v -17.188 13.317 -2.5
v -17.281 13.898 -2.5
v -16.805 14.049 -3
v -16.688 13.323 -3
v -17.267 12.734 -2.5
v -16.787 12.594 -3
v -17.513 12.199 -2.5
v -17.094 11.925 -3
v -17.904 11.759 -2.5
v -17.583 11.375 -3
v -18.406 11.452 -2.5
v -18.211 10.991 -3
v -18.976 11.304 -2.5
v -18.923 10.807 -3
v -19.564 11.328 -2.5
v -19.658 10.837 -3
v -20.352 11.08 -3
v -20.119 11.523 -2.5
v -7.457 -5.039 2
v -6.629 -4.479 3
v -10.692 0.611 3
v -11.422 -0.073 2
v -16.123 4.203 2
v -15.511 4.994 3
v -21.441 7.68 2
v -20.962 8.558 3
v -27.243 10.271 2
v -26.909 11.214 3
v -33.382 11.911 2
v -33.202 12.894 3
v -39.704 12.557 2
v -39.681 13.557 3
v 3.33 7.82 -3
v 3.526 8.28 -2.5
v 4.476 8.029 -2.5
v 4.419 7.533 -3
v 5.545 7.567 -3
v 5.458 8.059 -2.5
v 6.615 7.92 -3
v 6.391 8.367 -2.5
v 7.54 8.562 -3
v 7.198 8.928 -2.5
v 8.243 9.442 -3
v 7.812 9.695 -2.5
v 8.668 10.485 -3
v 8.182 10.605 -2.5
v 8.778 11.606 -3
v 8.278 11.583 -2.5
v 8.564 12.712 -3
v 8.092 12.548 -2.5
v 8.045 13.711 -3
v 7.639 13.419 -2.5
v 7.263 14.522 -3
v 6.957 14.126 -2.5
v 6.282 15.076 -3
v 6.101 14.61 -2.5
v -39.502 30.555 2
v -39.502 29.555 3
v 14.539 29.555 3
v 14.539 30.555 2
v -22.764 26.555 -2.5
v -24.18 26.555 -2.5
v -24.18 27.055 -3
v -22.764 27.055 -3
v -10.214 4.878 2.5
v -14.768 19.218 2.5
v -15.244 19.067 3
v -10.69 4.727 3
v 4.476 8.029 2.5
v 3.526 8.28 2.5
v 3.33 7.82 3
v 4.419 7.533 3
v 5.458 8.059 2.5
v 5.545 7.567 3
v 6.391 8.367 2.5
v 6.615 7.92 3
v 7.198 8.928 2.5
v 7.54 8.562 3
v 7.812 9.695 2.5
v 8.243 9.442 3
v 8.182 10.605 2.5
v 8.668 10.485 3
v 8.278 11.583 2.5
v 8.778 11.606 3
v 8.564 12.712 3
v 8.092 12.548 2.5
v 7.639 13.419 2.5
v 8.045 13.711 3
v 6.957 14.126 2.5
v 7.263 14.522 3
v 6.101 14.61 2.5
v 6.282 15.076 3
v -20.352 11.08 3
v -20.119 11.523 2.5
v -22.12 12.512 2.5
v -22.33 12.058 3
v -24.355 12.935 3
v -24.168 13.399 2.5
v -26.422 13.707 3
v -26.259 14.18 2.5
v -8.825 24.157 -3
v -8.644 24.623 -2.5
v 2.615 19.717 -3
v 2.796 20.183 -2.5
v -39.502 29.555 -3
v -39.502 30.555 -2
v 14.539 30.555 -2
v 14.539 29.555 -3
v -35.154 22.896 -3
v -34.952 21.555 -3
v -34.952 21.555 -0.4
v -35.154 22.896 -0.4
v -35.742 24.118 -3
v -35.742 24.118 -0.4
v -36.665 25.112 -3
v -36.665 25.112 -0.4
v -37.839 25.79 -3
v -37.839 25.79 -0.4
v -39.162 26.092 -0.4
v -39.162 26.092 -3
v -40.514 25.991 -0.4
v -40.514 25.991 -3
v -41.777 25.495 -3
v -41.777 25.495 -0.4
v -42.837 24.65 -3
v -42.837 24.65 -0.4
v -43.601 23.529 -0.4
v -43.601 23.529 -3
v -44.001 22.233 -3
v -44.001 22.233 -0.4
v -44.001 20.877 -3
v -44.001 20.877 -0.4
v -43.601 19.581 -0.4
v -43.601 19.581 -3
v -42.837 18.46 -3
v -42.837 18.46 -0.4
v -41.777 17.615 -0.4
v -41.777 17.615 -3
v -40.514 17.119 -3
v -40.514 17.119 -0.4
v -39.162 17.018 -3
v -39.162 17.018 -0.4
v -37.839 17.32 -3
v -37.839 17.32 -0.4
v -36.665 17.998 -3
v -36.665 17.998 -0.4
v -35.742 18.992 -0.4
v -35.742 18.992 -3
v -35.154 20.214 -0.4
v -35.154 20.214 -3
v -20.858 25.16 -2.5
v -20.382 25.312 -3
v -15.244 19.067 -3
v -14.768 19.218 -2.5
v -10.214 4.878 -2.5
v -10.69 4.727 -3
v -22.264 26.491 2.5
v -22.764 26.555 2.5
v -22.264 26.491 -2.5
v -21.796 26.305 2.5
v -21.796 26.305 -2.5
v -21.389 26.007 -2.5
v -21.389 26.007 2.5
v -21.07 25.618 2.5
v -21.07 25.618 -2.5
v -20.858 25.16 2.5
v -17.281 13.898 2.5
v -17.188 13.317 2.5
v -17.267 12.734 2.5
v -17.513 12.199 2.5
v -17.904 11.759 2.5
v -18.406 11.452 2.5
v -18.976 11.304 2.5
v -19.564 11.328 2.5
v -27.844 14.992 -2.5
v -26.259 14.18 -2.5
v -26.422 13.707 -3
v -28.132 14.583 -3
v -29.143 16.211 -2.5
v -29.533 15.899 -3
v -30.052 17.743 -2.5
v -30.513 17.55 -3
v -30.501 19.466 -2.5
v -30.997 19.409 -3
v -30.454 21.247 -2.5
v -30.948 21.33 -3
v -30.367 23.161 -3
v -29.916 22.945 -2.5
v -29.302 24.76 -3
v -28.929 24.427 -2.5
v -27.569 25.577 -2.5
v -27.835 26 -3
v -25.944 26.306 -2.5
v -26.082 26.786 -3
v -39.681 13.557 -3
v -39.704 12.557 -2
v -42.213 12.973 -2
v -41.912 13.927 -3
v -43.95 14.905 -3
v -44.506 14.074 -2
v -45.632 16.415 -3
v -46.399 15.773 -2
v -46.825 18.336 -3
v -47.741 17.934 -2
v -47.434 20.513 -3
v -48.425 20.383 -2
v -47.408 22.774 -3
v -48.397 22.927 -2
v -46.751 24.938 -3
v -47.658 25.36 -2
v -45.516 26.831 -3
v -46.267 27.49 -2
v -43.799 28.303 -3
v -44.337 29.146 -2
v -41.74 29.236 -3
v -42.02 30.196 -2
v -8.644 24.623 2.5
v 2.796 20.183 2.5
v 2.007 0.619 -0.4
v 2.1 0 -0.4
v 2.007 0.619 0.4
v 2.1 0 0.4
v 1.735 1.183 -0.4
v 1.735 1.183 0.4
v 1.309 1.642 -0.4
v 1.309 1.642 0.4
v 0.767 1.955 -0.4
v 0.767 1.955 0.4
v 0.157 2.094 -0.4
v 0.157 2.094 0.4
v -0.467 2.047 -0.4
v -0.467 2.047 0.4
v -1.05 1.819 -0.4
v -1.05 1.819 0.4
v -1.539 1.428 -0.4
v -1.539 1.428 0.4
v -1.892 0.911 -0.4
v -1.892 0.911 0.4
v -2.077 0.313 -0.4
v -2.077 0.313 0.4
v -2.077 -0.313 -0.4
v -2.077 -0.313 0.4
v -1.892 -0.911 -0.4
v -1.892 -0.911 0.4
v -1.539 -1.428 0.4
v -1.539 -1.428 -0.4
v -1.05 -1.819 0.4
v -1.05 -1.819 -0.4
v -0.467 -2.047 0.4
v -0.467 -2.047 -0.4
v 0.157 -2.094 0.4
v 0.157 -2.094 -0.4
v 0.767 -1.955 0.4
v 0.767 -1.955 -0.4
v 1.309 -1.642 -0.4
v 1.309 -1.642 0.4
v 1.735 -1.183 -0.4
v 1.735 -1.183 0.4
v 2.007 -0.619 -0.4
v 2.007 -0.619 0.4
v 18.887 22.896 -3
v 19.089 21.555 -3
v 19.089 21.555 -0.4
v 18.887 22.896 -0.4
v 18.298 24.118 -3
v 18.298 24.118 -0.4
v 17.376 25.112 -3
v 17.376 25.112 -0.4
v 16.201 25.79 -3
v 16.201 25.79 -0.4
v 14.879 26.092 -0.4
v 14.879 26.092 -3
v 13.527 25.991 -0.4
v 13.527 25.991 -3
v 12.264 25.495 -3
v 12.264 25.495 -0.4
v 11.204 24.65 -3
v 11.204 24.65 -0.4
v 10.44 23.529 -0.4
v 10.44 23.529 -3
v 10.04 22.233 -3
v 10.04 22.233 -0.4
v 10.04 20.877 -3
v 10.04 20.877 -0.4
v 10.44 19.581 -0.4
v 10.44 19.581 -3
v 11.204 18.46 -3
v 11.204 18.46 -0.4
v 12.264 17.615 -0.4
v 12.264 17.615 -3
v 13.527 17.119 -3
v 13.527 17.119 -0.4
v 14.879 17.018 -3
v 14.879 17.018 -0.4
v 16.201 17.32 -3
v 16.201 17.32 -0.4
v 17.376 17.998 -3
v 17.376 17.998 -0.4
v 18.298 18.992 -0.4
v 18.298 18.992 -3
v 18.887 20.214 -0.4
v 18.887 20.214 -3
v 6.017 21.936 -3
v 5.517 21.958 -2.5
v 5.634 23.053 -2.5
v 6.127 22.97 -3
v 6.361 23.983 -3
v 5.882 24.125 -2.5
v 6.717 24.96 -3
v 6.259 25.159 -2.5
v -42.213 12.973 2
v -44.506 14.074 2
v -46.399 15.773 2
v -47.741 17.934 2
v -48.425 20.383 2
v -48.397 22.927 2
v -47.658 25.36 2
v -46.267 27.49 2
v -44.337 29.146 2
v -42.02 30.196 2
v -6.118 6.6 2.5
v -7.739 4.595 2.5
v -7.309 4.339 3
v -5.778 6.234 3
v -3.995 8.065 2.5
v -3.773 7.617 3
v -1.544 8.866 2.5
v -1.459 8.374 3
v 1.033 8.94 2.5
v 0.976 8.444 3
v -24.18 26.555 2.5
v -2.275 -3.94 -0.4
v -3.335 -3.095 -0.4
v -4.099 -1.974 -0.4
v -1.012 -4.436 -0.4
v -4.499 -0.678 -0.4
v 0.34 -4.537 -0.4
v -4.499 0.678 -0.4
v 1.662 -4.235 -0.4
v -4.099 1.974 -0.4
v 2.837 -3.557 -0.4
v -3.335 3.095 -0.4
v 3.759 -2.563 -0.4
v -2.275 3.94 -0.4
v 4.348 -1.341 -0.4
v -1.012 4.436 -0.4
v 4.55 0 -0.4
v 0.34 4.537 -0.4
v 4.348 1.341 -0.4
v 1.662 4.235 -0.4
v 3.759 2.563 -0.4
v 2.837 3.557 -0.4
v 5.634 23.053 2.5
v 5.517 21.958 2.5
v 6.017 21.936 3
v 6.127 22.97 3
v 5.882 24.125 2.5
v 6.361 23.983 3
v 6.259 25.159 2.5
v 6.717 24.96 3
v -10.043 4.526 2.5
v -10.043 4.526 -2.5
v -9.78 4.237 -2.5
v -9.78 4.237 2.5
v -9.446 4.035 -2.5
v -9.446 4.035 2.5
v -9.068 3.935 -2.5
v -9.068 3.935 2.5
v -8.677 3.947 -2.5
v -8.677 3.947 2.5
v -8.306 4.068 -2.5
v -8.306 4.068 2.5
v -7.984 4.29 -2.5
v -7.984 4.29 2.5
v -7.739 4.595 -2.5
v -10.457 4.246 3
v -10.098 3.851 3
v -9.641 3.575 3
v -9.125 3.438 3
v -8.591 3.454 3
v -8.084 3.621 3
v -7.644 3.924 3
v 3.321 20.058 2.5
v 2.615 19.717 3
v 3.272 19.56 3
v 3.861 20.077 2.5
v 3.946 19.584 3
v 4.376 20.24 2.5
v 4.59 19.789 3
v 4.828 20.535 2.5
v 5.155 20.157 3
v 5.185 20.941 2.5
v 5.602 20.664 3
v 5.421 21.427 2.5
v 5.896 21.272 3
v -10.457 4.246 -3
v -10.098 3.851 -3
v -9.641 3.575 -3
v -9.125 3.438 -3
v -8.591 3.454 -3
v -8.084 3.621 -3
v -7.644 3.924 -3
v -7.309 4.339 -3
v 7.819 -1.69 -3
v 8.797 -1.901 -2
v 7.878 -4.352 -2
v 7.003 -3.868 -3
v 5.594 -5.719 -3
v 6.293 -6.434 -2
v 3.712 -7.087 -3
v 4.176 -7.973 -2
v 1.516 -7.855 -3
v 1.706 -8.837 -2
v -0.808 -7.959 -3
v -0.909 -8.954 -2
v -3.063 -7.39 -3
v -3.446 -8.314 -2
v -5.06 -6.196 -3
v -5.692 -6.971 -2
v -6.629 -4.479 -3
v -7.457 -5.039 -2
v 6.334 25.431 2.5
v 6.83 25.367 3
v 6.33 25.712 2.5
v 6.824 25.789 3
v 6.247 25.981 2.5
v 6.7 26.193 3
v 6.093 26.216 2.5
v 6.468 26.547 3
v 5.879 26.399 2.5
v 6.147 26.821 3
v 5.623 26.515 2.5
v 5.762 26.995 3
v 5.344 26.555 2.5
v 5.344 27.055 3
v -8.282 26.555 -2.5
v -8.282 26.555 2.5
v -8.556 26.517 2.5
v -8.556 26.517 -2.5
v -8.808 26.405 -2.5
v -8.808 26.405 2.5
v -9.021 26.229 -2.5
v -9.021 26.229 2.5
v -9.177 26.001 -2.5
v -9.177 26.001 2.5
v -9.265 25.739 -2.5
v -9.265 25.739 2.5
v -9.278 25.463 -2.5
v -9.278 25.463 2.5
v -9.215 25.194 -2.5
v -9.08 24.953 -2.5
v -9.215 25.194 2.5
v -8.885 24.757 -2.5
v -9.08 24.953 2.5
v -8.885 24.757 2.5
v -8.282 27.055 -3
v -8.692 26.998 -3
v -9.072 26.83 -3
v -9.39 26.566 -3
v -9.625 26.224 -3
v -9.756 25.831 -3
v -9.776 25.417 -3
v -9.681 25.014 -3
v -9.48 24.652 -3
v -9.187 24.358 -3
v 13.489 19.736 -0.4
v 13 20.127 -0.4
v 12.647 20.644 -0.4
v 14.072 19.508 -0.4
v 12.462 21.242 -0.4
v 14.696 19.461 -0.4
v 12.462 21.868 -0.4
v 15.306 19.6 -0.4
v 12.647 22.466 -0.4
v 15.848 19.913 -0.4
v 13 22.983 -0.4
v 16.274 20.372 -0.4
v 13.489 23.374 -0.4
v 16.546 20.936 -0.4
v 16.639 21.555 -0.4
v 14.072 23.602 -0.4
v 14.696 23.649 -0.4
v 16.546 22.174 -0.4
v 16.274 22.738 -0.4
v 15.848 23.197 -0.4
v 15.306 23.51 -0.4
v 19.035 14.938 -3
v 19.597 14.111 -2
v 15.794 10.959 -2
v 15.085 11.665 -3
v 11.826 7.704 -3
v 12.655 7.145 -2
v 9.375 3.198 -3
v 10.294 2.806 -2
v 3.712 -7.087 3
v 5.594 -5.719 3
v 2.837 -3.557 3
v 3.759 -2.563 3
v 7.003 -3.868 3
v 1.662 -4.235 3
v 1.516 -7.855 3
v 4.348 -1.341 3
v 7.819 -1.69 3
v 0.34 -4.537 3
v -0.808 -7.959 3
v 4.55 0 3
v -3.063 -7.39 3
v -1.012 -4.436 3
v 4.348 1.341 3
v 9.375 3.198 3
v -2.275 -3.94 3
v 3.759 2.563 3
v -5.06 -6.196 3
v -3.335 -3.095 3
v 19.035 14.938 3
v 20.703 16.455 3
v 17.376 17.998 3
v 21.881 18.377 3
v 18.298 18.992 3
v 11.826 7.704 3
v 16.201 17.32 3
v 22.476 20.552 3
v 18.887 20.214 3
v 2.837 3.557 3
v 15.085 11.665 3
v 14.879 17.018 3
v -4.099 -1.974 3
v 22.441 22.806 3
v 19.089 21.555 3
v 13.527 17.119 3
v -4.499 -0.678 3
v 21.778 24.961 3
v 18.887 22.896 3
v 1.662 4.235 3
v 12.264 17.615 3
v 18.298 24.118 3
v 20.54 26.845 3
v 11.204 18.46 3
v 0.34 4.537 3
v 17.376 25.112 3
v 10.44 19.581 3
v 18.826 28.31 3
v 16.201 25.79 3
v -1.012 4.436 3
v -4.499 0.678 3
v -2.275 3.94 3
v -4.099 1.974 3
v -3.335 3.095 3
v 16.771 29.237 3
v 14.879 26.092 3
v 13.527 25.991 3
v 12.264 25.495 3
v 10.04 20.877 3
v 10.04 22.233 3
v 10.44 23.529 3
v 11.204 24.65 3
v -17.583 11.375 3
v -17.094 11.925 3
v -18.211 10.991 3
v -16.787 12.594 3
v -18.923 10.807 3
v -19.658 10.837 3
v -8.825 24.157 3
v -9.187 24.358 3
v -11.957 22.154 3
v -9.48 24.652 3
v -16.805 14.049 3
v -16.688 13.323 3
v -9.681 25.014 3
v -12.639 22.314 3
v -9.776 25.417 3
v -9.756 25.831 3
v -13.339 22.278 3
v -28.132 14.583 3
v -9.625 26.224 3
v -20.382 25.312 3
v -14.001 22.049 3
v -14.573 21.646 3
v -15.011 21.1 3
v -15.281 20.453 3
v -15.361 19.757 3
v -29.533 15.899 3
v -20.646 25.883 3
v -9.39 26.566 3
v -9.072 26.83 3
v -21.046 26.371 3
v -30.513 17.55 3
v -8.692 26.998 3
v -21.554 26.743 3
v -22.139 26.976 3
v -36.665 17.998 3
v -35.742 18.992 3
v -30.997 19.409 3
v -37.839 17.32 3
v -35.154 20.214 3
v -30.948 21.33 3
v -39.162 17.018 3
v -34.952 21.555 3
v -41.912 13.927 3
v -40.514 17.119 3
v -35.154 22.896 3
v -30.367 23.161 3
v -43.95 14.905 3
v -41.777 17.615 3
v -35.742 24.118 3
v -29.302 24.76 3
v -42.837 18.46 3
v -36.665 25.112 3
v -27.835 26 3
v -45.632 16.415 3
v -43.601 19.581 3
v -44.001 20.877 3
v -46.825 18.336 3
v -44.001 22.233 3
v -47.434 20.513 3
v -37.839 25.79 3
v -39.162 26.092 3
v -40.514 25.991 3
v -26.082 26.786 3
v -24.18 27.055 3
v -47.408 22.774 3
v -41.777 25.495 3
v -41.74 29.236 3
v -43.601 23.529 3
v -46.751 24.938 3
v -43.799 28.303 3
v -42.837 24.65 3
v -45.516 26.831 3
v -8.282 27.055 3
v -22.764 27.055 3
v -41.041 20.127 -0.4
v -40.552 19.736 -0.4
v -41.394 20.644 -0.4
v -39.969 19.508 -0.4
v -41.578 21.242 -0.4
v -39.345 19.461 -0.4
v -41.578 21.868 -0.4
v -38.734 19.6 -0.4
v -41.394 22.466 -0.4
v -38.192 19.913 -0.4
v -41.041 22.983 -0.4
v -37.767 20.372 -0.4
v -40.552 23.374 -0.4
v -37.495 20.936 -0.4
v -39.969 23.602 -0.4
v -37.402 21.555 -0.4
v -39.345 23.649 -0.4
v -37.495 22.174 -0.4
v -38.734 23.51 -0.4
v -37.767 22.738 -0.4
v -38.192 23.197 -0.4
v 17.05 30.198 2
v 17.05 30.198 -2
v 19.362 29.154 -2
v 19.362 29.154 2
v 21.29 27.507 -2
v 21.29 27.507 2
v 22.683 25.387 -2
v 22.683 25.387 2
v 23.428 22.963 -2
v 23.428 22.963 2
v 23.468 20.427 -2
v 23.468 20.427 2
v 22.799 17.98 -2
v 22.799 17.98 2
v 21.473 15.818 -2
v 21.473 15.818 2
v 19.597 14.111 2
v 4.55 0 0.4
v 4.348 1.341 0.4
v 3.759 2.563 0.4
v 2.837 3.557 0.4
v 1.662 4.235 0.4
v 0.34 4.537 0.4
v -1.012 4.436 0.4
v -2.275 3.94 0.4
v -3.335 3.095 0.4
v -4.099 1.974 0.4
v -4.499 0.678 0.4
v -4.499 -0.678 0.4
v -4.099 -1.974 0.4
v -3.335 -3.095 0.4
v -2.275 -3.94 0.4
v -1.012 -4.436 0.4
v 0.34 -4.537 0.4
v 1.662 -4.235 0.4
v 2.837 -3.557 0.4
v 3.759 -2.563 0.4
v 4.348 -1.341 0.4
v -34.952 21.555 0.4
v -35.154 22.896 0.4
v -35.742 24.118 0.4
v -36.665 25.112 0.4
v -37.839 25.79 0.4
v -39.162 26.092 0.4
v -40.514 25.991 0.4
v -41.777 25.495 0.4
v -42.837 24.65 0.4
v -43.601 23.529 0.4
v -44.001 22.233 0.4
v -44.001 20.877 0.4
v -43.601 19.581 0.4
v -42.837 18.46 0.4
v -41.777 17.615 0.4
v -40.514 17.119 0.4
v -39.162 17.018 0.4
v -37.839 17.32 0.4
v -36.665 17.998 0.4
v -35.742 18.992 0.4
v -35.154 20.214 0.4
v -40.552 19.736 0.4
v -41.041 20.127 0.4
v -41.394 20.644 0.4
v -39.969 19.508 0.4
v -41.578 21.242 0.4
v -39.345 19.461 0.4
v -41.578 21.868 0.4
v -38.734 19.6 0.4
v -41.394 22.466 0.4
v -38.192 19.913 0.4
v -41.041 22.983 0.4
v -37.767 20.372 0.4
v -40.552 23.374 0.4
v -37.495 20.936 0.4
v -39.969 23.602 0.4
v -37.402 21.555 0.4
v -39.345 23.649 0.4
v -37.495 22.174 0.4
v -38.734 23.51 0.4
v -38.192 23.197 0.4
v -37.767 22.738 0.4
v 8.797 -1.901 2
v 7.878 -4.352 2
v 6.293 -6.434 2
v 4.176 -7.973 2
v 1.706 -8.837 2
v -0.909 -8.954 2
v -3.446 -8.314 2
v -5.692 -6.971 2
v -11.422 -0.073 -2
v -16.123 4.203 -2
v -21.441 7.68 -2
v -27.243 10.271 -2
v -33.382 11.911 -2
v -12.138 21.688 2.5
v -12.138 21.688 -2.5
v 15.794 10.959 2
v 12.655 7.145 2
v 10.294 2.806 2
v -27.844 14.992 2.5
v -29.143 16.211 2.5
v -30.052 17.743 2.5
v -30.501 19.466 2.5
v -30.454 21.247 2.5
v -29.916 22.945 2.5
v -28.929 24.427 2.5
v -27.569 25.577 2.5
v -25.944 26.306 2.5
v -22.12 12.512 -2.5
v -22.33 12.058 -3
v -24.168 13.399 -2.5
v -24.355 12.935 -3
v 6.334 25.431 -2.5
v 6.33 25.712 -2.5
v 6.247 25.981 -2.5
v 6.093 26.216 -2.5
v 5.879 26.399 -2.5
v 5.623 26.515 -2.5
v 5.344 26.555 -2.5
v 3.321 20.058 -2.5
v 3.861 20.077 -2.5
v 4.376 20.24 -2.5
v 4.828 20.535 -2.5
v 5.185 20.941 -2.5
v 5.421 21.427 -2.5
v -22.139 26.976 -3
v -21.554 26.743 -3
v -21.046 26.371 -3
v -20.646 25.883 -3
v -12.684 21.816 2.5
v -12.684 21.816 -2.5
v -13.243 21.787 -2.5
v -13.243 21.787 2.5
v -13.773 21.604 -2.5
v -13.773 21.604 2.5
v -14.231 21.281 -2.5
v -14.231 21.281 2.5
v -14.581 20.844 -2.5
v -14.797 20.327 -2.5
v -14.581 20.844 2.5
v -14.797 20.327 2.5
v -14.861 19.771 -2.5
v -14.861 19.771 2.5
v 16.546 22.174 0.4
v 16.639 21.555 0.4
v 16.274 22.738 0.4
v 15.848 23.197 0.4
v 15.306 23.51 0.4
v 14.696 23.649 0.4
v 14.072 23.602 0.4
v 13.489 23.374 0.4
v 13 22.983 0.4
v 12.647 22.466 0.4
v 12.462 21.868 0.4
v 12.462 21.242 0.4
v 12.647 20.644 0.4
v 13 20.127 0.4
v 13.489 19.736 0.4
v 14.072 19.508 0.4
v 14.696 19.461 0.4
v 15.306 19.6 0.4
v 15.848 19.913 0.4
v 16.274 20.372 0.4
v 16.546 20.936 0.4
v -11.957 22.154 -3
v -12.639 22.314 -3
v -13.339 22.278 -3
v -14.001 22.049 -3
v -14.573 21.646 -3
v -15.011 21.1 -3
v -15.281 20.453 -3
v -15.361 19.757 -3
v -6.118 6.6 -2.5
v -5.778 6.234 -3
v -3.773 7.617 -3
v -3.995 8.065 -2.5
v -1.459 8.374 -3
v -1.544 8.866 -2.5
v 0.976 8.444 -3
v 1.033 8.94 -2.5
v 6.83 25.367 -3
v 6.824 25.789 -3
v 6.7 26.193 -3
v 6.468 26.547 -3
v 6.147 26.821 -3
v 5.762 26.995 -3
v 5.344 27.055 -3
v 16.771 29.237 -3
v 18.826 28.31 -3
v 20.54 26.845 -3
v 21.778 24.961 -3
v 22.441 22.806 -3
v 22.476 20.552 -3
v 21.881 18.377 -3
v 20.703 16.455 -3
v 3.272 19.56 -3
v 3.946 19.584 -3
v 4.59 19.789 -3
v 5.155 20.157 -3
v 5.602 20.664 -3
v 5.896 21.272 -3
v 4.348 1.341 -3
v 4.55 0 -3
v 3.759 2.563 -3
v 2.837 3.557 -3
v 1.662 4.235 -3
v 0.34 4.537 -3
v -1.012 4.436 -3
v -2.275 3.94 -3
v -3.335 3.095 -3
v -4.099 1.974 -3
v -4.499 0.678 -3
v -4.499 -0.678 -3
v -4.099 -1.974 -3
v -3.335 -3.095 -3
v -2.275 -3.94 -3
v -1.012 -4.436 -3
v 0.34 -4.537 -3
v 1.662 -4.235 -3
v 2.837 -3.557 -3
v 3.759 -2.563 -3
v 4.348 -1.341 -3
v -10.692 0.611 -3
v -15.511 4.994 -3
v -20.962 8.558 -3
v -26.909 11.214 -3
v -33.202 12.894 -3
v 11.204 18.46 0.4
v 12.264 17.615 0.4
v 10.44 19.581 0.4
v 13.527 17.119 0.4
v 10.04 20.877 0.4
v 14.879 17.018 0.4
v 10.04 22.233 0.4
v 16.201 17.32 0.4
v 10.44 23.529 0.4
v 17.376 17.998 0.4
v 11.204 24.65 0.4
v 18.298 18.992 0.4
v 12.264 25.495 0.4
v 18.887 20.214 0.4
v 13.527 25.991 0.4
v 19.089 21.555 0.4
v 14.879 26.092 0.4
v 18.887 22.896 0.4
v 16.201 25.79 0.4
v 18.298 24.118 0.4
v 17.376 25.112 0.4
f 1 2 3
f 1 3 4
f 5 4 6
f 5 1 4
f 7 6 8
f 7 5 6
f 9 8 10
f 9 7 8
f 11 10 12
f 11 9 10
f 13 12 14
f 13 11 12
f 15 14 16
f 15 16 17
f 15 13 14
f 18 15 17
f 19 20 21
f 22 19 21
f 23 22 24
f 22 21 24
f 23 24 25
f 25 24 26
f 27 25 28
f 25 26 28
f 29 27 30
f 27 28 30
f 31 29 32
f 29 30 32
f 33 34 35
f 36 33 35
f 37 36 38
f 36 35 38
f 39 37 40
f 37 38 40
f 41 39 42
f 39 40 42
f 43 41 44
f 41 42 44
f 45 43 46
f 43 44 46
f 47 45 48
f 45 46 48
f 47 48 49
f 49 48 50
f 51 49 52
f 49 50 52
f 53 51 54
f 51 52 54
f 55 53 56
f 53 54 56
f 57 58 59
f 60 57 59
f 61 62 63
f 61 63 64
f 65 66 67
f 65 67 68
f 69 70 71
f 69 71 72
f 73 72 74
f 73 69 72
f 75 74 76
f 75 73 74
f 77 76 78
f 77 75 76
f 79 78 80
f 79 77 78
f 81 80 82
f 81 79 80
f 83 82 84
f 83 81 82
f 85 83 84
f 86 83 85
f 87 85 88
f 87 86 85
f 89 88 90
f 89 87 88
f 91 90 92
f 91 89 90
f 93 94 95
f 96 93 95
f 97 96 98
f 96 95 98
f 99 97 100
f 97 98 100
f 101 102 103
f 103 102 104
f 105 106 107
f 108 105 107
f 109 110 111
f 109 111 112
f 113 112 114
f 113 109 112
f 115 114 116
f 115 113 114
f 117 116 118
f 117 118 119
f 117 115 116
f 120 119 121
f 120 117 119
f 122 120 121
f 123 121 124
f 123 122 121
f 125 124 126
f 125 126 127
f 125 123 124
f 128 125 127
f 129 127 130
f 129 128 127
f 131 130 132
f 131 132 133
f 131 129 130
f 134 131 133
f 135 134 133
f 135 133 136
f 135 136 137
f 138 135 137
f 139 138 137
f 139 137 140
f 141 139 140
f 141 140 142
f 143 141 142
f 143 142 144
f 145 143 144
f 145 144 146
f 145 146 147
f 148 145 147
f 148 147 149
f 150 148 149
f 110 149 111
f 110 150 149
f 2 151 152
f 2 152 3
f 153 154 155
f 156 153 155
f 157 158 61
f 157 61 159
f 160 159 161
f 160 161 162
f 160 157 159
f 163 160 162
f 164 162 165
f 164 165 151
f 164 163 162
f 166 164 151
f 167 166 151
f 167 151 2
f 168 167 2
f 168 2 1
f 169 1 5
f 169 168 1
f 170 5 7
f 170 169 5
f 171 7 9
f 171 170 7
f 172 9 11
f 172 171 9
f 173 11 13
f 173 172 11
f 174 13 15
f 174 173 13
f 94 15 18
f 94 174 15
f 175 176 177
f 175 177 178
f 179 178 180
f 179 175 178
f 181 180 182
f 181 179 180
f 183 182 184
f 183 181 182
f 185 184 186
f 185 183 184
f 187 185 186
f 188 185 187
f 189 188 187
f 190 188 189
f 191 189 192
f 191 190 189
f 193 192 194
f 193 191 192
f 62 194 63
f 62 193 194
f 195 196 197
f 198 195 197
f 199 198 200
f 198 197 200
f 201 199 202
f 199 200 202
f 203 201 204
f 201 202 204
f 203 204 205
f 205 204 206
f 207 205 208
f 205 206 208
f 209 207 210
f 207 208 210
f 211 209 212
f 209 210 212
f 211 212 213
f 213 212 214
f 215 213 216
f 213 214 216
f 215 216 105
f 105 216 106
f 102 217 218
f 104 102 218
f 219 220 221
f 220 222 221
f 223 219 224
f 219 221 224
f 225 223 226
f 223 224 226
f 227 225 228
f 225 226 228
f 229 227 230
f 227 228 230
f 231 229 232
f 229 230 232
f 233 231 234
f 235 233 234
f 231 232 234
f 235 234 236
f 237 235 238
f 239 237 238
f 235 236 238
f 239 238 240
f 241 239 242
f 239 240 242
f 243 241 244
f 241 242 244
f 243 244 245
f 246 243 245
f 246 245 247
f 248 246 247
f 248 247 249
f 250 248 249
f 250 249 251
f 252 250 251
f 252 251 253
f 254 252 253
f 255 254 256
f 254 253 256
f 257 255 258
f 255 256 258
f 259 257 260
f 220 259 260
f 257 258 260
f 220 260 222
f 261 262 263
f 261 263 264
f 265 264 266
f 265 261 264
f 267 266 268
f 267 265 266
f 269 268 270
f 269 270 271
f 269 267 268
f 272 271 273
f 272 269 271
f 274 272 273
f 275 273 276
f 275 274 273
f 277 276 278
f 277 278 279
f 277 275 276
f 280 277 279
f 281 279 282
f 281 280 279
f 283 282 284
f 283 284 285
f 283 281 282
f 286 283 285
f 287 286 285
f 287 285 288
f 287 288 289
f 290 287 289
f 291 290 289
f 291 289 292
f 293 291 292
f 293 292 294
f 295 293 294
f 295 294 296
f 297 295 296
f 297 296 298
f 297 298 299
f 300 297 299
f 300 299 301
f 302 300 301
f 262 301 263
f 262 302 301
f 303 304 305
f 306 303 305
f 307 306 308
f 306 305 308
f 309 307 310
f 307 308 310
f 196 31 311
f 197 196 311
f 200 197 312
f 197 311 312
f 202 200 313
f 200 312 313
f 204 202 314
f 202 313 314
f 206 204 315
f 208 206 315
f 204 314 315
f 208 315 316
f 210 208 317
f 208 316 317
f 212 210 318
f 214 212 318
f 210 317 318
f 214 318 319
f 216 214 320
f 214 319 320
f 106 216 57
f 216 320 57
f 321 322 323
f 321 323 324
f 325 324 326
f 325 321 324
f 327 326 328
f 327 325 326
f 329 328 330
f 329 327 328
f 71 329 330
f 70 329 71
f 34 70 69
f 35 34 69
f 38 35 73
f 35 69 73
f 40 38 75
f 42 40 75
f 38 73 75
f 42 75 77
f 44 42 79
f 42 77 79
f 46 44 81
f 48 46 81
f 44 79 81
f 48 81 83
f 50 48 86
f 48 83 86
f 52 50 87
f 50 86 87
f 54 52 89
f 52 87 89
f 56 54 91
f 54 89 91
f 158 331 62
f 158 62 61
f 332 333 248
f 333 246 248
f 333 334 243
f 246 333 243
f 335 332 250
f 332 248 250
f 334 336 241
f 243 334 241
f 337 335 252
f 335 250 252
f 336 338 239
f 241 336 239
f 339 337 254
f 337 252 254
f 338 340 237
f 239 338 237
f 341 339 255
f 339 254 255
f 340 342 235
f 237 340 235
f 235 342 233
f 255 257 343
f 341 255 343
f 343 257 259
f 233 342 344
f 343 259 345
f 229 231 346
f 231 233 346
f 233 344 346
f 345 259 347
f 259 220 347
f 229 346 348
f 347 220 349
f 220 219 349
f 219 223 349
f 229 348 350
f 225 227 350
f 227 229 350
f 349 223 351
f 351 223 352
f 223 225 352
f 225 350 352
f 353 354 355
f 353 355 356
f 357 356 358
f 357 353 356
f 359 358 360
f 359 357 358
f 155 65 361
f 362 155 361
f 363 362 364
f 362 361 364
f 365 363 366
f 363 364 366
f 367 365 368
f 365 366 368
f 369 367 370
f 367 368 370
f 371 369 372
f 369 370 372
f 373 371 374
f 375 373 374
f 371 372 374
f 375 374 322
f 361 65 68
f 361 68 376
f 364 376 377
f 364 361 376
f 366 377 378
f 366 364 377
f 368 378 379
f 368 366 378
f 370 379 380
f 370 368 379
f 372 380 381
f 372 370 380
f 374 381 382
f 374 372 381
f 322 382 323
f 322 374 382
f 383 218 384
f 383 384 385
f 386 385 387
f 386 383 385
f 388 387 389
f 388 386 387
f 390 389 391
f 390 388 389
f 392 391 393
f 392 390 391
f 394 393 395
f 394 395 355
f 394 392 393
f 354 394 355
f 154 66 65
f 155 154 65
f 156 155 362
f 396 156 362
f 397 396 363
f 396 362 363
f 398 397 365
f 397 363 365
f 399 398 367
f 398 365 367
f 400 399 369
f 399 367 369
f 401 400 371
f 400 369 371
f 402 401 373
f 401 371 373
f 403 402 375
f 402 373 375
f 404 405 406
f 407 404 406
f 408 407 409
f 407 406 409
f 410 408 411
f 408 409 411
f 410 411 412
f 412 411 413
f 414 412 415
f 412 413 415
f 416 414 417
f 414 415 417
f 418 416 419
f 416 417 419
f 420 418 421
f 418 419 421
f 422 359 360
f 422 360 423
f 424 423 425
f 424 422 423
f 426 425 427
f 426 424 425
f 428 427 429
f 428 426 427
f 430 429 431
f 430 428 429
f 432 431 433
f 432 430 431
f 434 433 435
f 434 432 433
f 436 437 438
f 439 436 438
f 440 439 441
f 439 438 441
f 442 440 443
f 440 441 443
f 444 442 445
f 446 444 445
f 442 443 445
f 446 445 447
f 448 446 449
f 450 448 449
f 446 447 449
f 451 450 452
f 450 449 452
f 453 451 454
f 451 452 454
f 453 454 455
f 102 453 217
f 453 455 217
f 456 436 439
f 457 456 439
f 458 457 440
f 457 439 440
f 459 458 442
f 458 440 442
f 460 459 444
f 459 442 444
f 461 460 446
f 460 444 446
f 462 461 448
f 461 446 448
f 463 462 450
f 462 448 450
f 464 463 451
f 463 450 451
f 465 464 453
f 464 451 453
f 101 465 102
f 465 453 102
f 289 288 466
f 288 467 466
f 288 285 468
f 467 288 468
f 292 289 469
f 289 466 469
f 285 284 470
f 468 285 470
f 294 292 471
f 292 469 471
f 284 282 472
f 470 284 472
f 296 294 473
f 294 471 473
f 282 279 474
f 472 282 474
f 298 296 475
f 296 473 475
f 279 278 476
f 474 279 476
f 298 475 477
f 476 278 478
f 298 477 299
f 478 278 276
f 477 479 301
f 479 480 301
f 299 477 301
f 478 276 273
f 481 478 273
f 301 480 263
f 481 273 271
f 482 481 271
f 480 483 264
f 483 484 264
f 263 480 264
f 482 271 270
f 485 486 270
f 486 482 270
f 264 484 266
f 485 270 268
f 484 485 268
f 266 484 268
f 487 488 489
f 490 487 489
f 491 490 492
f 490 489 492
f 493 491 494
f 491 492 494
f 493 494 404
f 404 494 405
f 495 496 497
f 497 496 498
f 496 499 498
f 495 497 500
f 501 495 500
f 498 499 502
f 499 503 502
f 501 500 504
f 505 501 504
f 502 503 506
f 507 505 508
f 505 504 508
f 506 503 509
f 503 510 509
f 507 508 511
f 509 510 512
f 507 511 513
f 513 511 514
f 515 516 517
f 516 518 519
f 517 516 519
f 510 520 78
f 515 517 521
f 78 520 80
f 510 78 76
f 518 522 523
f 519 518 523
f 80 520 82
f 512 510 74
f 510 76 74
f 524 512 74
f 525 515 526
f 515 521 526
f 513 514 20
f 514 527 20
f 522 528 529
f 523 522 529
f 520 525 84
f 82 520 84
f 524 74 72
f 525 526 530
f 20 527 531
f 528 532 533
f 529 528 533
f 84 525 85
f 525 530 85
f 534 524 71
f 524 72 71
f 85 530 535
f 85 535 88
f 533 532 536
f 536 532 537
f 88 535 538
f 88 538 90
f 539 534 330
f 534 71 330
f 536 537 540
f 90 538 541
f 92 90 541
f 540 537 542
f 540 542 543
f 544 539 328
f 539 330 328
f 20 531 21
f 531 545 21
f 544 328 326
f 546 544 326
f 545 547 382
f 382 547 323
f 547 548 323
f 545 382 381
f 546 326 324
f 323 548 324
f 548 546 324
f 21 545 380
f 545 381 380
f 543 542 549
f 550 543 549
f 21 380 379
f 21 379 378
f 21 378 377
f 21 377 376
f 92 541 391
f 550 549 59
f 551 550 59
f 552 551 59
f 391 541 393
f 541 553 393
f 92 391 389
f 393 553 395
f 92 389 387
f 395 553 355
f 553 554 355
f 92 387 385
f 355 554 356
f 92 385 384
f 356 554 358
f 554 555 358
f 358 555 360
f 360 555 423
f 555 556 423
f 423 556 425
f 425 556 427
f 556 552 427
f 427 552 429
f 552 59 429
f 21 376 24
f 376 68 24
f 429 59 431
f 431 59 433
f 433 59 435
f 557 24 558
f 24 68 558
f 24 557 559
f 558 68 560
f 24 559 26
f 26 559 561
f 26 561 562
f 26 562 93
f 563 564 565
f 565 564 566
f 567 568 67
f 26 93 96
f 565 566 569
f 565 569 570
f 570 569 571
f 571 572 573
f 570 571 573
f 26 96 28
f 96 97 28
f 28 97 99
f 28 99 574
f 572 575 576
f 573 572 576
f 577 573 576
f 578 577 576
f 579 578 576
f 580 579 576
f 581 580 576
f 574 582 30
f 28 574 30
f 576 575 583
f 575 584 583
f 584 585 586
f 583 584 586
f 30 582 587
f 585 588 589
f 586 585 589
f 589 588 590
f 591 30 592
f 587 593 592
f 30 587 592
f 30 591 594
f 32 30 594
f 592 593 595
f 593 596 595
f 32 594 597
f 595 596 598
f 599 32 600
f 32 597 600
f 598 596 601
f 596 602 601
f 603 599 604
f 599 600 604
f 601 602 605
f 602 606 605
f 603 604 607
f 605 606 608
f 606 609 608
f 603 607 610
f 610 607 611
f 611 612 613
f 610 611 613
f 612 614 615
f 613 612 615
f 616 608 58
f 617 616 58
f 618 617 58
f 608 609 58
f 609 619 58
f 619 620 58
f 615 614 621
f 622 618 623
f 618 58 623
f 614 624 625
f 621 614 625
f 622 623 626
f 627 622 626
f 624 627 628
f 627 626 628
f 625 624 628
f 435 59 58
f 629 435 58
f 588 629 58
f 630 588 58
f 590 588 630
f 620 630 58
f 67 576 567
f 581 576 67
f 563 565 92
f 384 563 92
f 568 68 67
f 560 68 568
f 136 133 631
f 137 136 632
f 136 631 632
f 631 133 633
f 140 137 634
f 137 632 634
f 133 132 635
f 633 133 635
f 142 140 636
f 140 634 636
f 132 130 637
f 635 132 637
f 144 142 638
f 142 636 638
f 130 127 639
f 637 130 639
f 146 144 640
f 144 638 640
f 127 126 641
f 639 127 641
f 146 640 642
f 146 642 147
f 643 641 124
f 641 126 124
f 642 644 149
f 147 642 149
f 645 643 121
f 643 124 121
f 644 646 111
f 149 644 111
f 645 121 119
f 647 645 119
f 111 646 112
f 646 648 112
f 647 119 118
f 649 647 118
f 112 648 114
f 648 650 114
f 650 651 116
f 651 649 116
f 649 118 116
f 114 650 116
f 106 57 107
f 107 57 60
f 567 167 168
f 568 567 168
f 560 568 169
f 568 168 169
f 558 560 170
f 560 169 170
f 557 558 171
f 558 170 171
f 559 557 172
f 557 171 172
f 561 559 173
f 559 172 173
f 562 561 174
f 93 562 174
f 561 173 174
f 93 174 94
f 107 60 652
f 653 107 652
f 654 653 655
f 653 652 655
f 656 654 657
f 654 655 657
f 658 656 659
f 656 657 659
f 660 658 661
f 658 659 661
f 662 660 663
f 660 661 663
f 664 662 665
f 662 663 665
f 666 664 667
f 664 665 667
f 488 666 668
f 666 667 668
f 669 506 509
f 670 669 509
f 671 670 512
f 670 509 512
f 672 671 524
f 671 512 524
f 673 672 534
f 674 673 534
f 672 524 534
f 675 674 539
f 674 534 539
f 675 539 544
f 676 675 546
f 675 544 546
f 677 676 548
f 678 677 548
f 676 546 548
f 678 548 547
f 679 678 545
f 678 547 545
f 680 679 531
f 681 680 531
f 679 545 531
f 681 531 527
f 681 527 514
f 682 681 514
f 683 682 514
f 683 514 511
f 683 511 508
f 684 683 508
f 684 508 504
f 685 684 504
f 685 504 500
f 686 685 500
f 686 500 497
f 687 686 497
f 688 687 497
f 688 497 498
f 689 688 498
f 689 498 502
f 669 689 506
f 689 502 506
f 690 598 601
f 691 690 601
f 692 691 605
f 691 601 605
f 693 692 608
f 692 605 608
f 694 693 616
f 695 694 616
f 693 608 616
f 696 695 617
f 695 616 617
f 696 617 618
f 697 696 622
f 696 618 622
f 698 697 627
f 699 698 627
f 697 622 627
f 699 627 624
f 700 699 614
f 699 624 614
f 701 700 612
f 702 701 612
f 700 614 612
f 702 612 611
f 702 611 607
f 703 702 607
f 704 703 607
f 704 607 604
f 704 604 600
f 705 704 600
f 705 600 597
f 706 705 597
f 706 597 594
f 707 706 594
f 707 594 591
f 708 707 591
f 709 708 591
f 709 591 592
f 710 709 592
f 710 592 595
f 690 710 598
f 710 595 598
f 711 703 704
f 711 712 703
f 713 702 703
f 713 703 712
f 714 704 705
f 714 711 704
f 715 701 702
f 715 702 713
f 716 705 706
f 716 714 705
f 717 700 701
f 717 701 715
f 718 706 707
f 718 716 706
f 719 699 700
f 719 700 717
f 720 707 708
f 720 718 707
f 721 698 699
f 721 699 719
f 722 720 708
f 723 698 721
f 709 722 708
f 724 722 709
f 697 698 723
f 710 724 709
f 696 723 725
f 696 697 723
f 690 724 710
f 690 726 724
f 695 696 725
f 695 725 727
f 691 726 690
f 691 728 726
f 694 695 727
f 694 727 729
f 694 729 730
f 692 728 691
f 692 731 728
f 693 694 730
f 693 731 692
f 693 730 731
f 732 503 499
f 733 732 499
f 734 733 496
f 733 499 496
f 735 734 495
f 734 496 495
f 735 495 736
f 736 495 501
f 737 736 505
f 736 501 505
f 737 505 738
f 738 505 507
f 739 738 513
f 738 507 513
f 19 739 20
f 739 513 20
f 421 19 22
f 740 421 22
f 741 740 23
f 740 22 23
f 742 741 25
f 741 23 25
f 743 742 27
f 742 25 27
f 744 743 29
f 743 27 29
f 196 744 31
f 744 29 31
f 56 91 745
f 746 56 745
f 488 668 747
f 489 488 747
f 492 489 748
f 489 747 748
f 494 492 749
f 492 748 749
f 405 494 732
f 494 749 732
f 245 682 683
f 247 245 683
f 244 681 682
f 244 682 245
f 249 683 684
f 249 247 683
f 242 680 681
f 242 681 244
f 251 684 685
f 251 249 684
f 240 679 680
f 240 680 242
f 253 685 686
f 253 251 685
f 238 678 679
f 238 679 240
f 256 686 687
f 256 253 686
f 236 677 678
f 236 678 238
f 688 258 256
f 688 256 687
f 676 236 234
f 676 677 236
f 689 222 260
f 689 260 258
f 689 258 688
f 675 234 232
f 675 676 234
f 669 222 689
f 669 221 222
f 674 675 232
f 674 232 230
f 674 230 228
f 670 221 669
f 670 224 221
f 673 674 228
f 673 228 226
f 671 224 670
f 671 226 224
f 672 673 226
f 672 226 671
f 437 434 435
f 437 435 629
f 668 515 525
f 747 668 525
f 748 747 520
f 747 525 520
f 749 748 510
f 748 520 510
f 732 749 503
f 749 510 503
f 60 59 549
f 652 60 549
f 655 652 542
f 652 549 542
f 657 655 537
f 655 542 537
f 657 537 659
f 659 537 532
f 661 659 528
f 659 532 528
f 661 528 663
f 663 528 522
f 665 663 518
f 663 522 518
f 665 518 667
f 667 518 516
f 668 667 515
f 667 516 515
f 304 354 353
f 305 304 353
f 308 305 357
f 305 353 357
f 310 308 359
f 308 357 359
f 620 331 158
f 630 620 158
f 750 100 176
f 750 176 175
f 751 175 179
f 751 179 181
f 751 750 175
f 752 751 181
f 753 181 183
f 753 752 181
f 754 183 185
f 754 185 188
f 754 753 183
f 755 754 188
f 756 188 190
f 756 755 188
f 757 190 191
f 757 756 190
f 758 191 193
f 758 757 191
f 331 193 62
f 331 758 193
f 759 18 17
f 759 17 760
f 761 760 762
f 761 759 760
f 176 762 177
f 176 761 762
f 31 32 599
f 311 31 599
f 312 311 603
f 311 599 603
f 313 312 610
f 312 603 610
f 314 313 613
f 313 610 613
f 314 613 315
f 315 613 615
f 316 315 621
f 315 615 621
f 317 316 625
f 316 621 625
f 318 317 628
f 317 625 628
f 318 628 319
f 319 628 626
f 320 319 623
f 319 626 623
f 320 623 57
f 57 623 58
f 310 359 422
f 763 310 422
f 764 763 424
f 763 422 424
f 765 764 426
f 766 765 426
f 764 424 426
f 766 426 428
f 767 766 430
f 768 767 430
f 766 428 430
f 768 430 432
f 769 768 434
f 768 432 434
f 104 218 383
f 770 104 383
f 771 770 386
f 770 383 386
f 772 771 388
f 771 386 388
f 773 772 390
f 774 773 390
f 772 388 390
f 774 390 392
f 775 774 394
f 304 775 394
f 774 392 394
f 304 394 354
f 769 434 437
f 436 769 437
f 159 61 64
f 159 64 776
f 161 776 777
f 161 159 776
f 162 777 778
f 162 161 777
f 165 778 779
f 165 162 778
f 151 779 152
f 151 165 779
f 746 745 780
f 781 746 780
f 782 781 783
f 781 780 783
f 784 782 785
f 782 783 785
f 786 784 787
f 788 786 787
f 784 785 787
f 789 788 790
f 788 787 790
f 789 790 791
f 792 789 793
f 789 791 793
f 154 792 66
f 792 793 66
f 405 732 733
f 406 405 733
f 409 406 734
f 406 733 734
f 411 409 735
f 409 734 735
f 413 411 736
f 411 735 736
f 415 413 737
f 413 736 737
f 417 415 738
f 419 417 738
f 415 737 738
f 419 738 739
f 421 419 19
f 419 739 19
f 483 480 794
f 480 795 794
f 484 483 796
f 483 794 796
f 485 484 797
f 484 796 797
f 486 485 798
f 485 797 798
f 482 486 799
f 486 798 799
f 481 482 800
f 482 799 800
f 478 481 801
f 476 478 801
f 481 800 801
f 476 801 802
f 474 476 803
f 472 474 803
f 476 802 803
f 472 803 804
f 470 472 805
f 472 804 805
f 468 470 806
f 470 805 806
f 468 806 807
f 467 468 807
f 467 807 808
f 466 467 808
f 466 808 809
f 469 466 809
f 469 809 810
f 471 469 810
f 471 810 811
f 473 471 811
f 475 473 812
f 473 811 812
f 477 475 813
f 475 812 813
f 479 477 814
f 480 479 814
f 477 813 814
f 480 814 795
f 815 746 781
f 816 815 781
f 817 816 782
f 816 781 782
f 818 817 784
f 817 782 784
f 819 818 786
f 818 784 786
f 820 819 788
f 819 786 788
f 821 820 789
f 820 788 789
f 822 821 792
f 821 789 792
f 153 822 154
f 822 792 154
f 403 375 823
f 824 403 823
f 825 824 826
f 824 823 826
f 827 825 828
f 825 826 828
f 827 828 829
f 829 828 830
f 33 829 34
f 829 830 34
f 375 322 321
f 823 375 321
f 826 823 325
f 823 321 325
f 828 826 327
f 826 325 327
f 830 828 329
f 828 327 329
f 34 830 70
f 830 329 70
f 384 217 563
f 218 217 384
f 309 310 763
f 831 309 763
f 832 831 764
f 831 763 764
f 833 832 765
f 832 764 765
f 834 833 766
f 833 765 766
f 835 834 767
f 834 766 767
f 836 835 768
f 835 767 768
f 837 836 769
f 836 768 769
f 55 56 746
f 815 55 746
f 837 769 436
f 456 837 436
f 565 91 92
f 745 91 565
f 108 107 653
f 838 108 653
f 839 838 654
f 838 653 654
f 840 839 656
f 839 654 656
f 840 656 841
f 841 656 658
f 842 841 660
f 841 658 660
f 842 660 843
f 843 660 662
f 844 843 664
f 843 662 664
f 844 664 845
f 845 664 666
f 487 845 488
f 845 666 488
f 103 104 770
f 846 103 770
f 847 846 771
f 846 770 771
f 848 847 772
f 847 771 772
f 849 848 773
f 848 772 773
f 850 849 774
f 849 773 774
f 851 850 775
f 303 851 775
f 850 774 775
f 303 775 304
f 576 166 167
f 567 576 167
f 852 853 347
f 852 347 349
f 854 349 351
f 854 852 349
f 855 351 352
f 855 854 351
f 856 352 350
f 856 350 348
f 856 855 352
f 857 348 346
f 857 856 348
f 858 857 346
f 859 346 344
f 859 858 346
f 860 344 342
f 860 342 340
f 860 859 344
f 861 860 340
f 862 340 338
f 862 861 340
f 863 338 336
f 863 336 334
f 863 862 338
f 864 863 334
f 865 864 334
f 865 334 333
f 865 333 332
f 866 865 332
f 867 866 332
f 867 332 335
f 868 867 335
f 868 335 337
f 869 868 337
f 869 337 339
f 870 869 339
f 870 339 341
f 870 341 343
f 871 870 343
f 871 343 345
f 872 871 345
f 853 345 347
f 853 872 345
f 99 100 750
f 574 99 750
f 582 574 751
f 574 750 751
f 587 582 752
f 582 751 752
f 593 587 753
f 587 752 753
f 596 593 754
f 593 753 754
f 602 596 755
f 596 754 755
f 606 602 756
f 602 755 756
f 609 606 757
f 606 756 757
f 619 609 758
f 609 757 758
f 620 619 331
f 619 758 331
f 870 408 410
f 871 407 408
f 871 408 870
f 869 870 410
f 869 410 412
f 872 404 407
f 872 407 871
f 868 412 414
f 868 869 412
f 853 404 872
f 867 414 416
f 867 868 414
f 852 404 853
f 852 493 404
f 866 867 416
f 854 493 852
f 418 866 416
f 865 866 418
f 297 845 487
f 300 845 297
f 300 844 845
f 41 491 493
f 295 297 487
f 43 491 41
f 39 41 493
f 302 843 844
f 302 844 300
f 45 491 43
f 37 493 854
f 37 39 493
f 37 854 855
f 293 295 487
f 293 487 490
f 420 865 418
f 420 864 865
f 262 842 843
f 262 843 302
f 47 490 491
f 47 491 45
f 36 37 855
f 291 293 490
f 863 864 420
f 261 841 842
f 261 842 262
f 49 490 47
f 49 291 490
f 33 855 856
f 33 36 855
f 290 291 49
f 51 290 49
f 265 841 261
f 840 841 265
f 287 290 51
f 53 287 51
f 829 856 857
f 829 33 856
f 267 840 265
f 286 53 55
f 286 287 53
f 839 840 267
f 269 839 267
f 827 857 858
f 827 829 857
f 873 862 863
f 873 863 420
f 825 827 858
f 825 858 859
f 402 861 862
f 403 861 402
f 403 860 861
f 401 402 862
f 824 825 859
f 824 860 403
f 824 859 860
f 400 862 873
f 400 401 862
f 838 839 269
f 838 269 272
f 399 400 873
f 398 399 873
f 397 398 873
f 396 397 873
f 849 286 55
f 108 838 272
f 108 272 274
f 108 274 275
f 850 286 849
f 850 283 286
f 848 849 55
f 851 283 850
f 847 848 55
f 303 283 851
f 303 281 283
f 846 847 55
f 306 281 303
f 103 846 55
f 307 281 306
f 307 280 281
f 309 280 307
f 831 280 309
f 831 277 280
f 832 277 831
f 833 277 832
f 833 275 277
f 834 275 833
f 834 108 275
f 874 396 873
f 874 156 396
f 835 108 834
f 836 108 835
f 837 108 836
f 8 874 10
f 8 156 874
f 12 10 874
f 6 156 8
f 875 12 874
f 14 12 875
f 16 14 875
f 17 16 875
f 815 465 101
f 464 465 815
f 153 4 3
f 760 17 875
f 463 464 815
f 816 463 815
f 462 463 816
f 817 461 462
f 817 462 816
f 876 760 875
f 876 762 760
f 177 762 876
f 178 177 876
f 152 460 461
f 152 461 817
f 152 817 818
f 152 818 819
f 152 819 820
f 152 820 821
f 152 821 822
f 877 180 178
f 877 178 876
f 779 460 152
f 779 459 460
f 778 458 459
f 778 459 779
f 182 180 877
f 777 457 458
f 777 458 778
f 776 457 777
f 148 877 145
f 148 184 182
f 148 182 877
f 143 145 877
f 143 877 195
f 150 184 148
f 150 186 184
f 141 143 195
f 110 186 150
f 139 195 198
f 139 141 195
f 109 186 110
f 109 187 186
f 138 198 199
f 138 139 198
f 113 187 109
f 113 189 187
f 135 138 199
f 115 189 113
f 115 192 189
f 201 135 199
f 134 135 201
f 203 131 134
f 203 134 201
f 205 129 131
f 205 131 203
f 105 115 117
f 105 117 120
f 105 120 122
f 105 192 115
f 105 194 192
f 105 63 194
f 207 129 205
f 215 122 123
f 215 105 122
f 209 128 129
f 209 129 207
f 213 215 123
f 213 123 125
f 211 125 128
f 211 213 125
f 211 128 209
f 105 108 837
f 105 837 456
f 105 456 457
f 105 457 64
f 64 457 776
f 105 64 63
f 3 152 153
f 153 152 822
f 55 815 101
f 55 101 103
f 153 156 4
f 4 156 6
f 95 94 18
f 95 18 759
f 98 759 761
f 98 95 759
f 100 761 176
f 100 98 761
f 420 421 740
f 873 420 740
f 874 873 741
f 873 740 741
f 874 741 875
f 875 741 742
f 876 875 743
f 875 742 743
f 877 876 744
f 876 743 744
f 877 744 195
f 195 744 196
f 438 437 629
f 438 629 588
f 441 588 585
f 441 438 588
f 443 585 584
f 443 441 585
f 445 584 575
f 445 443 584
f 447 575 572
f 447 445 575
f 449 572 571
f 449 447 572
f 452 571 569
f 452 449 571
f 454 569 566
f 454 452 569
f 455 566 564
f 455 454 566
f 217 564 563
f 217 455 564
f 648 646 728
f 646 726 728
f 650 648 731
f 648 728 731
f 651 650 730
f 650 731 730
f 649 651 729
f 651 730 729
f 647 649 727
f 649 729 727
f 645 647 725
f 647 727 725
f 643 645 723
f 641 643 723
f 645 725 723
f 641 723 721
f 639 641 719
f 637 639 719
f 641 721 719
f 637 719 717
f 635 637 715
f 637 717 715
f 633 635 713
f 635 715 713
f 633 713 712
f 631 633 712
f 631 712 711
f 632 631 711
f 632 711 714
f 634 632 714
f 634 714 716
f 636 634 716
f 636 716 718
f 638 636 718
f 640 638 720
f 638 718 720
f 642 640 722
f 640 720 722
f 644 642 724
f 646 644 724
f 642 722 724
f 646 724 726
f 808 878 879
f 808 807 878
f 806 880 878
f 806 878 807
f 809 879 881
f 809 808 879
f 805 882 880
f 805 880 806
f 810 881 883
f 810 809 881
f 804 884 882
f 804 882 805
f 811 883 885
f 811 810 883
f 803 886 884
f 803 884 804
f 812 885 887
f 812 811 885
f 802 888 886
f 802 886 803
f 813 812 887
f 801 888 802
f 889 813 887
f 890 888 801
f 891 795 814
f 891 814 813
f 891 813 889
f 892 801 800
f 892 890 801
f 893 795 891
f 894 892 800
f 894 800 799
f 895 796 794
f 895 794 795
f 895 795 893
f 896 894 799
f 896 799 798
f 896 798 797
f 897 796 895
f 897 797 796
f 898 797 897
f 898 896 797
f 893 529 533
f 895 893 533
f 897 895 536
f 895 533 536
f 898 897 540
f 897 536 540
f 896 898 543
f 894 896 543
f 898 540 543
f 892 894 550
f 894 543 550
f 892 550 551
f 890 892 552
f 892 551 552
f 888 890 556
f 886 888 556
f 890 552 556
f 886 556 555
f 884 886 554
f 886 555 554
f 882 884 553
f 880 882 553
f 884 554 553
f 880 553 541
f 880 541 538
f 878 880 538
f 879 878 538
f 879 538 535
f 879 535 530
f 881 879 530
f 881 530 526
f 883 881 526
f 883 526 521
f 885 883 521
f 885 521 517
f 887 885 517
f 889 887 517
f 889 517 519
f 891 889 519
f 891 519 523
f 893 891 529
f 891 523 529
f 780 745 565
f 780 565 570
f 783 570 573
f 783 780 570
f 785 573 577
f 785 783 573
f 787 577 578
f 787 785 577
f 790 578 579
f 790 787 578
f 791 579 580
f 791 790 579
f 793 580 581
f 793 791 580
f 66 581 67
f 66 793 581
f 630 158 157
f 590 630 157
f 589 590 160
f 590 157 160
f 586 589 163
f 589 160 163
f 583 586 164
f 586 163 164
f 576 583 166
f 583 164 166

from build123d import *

# Parameters (mm, degrees)
BOSS_EXTRUDE1_DEPTH      = 3
BOSS_EXTRUDE1_DEPTH_BACK = 3
SKETCH1_R                = 2.1
SKETCH2_R                = 4.55
CUT_EXTRUDE1_DEPTH       = 2.6
CHAMFER1_SIZE            = 1
CUT_EXTRUDE2_DEPTH       = 58.636966268
CHAMFER2_SIZE            = 0.5


with BuildPart() as part:
    # Sketch1 → Boss-Extrude1 (new, two sides: drawn at the far end of the back side and taken through both)
    with BuildSketch(Plane.XY.offset(-BOSS_EXTRUDE1_DEPTH_BACK)):
        with BuildLine():
            Line((-39.501683147, 30.554976886), (14.53901549, 30.554976886))
            ThreePointArc((14.53901549, 30.554976886), (23.141239174, 24.201058459), (19.597278951, 14.110920817))
            ThreePointArc((19.597278951, 14.110920817), (12.655063172, 7.14488544), (8.796867444, -1.901347727))
            ThreePointArc((8.796867444, -1.901347727), (1.705655337, -8.836896507), (-7.457341048, -5.038657013))
            ThreePointArc((-7.457341048, -5.038657013), (-21.441099585, 7.679919061), (-39.703613005, 12.557242486))
            ThreePointArc((-39.703613005, 12.557242486), (-48.501116729, 21.65594817), (-39.501683147, 30.554976886))
        make_face()
        Circle(SKETCH1_R, mode=Mode.SUBTRACT)
        with Locations((-39.501683147, 21.554976886)):
            Circle(SKETCH1_R, mode=Mode.SUBTRACT)
        with Locations((14.53901549, 21.554976886)):
            Circle(SKETCH1_R, mode=Mode.SUBTRACT)
    extrude(amount=BOSS_EXTRUDE1_DEPTH + BOSS_EXTRUDE1_DEPTH_BACK)

    # Sketch2 → Cut-Extrude1 (cut)
    with BuildSketch(Plane.XY.offset(3)):
        with Locations((-39.501683147, 21.554976886)):
            Circle(SKETCH2_R)
        with Locations((14.53901549, 21.554976886)):
            Circle(SKETCH2_R)
        Circle(SKETCH2_R)
    cut_extrude1 = extrude(amount=-CUT_EXTRUDE1_DEPTH, mode=Mode.SUBTRACT)

    # Mirror1: Cut-Extrude1 across plane
    add(cut_extrude1.mirror(Plane.XY), mode=Mode.SUBTRACT)

    # Chamfer1
    chamfer1_edges = [part.edges().sort_by_distance(p)[0] for p in [
        (1.705655337, -8.836896507, -3),
        (12.655063172, 7.14488544, -3),
        (-21.441099585, 7.679919061, -3),
        (23.141239174, 24.201058459, -3),
        (-48.501116729, 21.65594817, -3),
        (-12.481333828, 30.554976886, -3),
        (1.705655337, -8.836896507, 3),
        (12.655063172, 7.14488544, 3),
        (-21.441099585, 7.679919061, 3),
        (23.141239174, 24.201058459, 3),
        (-48.501116729, 21.65594817, 3),
        (-12.481333828, 30.554976886, 3),
    ]]
    chamfer(chamfer1_edges, length=CHAMFER1_SIZE)

    # Sketch3 → Cut-Extrude2 (cut, through all)
    with BuildSketch(Plane.XY.offset(3)):
        with BuildLine():
            Line((-24.180281108, 26.554976886), (-22.764342389, 26.554976886))
            ThreePointArc((-22.764342389, 26.554976886), (-21.583396496, 26.169091752), (-20.858160069, 25.160343686))
            Line((-20.858160069, 25.160343686), (-17.281431039, 13.89791957))
            ThreePointArc((-17.281431039, 13.89791957), (-17.903964164, 11.758849819), (-20.119238586, 11.522785996))
            ThreePointArc((-20.119238586, 11.522785996), (-23.13863628, 12.96831982), (-26.259194014, 14.180115968))
            ThreePointArc((-26.259194014, 14.180115968), (-30.454415742, 21.246945404), (-24.180281108, 26.554976886))
        make_face()
        with BuildLine():
            Line((-8.643875433, 24.622717198), (2.795841433, 20.183210519))
            ThreePointArc((2.795841433, 20.183210519), (4.612056387, 20.372573761), (5.51742454, 21.958387022))
            ThreePointArc((5.51742454, 21.958387022), (5.741336481, 23.592791168), (6.25883004, 25.159192739))
            ThreePointArc((6.25883004, 25.159192739), (6.178513352, 26.104179516), (5.344107869, 26.554976886))
            Line((5.344107869, 26.554976886), (-8.282085612, 26.554976886))
            ThreePointArc((-8.282085612, 26.554976886), (-9.265004655, 25.73901535), (-8.643875433, 24.622717198))
        make_face()
        with BuildLine():
            Line((-14.767813151, 19.218195089), (-10.2137058, 4.878196721))
            ThreePointArc((-10.2137058, 4.878196721), (-9.068134637, 3.935197355), (-7.738892439, 4.594512359))
            ThreePointArc((-7.738892439, 4.594512359), (-2.798782744, 8.553760293), (3.526217449, 8.280446274))
            ThreePointArc((3.526217449, 8.280446274), (8.030102489, 10.136580166), (6.10124738, 14.609803998))
            Line((6.10124738, 14.609803998), (-12.138051189, 21.688081264))
            ThreePointArc((-12.138051189, 21.688081264), (-14.230835601, 21.281395314), (-14.767813151, 19.218195089))
        make_face()
    extrude(amount=-CUT_EXTRUDE2_DEPTH, mode=Mode.SUBTRACT)

    # Chamfer2
    chamfer2_edges = [part.edges().sort_by_distance(p)[0] for p in [
        (6.178513352, 26.104179516, -3),
        (-1.468988872, 26.554976886, -3),
        (5.741336481, 23.592791168, -3),
        (-9.265004655, 25.73901535, -3),
        (4.612056387, 20.372573761, -3),
        (-2.924017, 22.402963859, -3),
        (6.178513352, 26.104179516, 3),
        (-1.468988872, 26.554976886, 3),
        (5.741336481, 23.592791168, 3),
        (-9.265004655, 25.73901535, 3),
        (4.612056387, 20.372573761, 3),
        (-2.924017, 22.402963859, 3),
        (-30.454415742, 21.246945404, -3),
        (-23.13863628, 12.96831982, -3),
        (-23.472311748, 26.554976886, -3),
        (-17.903964164, 11.758849819, -3),
        (-21.583396496, 26.169091752, -3),
        (-19.069795554, 19.529131628, -3),
        (-30.454415742, 21.246945404, 3),
        (-23.13863628, 12.96831982, 3),
        (-23.472311748, 26.554976886, 3),
        (-17.903964164, 11.758849819, 3),
        (-21.583396496, 26.169091752, 3),
        (-19.069795554, 19.529131628, 3),
        (-14.230835601, 21.281395314, -3),
        (-12.490759475, 12.048195905, -3),
        (-3.018401905, 18.148942631, -3),
        (-9.068134637, 3.935197355, -3),
        (8.030102489, 10.136580166, -3),
        (-2.798782744, 8.553760293, -3),
        (-14.230835601, 21.281395314, 3),
        (-12.490759475, 12.048195905, 3),
        (-3.018401905, 18.148942631, 3),
        (-9.068134637, 3.935197355, 3),
        (8.030102489, 10.136580166, 3),
        (-2.798782744, 8.553760293, 3),
    ]]
    chamfer(chamfer2_edges, length=CHAMFER2_SIZE)


solid = part.part
